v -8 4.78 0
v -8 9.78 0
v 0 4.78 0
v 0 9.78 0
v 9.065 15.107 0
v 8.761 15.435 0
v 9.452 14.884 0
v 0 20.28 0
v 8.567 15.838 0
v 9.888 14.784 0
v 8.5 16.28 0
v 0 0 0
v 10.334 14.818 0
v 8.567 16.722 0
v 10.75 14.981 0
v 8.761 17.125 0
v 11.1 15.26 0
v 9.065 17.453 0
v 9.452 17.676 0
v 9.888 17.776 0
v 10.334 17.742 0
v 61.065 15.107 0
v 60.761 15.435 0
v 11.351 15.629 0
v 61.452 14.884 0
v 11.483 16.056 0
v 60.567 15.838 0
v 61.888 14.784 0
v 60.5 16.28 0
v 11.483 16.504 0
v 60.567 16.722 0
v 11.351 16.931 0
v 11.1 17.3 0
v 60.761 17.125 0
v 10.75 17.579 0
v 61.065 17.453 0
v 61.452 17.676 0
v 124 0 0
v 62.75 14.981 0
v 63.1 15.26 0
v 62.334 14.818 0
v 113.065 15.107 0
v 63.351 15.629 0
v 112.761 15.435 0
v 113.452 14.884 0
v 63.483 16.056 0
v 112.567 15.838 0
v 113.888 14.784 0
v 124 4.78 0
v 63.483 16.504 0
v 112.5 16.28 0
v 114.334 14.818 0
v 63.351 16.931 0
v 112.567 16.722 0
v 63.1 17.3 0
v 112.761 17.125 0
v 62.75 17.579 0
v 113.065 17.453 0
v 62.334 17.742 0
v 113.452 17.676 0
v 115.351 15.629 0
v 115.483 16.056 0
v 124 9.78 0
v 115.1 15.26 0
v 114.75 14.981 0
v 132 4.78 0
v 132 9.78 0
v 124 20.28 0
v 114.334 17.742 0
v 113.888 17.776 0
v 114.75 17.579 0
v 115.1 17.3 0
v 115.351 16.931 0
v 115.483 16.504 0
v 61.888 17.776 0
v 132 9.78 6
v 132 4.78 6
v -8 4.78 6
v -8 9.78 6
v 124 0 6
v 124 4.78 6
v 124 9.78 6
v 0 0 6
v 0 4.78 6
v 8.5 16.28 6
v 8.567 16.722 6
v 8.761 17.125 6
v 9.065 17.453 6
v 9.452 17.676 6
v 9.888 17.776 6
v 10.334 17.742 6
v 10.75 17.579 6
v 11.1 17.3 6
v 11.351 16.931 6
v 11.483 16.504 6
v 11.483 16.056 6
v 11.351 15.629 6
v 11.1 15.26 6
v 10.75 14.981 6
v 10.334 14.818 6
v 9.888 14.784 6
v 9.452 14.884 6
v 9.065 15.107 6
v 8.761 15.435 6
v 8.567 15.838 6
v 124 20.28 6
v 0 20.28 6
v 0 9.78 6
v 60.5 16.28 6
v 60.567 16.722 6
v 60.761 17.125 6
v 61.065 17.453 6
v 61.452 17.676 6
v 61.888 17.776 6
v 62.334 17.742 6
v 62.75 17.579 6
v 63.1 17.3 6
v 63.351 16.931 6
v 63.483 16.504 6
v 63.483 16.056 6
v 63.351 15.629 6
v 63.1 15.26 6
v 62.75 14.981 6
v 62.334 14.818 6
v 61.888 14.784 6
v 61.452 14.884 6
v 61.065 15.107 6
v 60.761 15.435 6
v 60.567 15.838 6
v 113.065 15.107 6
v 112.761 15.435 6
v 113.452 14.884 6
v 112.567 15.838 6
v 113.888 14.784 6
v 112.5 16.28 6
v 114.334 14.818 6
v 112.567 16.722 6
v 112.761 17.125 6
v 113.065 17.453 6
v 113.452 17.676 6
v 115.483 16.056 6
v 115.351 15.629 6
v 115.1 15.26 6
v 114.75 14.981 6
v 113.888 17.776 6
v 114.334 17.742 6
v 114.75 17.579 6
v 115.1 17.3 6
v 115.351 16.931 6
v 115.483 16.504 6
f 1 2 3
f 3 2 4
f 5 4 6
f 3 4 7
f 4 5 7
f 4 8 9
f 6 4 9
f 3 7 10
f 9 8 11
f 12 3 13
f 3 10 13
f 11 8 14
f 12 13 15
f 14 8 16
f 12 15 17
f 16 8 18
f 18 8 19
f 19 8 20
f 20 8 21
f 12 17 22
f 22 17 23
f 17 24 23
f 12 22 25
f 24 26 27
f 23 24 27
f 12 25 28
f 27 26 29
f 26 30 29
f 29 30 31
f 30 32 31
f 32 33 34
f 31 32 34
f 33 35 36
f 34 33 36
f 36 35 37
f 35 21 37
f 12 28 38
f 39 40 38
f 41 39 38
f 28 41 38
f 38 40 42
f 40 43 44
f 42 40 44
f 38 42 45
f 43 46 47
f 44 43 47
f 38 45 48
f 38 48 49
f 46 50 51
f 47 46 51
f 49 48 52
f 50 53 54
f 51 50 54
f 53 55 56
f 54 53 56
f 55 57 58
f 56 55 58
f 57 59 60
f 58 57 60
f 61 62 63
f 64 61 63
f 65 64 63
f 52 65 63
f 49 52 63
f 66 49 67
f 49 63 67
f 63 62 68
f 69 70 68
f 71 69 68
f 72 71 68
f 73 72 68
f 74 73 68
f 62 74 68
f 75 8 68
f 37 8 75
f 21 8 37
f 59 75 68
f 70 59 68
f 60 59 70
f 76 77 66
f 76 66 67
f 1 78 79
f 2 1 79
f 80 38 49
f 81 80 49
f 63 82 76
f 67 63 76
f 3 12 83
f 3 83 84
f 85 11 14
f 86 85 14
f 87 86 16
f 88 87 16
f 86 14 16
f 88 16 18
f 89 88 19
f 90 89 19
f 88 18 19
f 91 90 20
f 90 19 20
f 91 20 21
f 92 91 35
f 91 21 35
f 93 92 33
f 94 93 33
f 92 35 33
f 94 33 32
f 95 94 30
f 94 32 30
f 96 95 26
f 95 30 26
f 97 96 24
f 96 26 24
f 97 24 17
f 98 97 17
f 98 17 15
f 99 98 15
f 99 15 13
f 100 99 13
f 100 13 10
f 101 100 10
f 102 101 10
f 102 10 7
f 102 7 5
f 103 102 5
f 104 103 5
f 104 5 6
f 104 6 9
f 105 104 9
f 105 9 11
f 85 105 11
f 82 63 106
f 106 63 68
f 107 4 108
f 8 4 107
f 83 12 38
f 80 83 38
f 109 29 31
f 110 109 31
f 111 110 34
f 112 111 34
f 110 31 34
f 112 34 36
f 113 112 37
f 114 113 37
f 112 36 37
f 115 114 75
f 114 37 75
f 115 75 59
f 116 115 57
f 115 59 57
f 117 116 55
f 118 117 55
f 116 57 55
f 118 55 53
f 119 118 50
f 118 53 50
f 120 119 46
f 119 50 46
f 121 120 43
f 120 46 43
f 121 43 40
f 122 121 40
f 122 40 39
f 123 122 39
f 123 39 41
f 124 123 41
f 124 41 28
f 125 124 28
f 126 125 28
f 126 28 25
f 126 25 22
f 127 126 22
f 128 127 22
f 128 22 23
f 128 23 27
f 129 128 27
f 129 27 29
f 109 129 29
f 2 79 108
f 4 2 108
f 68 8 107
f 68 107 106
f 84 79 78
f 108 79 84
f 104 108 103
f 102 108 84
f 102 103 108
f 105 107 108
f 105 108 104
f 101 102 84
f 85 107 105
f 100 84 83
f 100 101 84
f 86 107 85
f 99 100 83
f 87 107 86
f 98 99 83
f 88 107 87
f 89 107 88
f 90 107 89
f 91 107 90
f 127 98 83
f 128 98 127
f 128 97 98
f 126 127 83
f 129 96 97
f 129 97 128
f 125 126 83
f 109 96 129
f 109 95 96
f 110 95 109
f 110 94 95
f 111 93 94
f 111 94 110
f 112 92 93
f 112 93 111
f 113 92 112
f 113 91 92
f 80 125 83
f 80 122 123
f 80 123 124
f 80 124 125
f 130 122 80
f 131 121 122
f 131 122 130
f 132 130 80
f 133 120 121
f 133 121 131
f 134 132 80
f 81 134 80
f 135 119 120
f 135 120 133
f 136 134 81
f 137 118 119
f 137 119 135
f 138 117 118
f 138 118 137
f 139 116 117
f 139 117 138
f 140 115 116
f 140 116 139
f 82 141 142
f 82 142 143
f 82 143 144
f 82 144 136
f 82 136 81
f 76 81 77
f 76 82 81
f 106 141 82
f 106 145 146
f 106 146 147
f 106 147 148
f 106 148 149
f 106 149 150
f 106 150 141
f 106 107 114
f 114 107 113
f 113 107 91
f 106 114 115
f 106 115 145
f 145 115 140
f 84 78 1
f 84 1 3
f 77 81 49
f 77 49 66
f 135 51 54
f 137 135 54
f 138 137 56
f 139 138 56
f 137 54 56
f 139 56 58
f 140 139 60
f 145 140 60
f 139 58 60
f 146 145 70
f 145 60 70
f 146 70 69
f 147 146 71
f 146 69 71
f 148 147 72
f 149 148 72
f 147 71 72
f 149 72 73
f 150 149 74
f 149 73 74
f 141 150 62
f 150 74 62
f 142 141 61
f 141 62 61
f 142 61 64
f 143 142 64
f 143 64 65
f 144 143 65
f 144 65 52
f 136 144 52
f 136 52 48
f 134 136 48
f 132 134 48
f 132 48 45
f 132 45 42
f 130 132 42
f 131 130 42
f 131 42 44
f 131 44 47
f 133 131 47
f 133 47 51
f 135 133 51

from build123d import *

# Parameters (mm, degrees)
SKETCH_1_W          = 124
SKETCH_1_H          = 20.28
EXTRUDE_1_DEPTH     = 6
SKETCH_2_W          = 8
SKETCH_2_H          = 5
EXTRUDE_2_DEPTH     = 6
SKETCH_3_R          = 1.5
CUT_EXTRUDE_1_DEPTH = 134.683500852


with BuildPart() as part:
    # 草图1 → 凸台-拉伸1 (new body)
    with BuildSketch(Plane.XY):
        with Locations((62, 10.14)):
            Rectangle(SKETCH_1_W, SKETCH_1_H)
    extrude(amount=EXTRUDE_1_DEPTH)

    # 草图2 → 凸台-拉伸2 (add)
    with BuildSketch(Plane.XY.offset(6)):
        with Locations((-4, 7.28)):
            Rectangle(SKETCH_2_W, SKETCH_2_H)
        with Locations((128, 7.28)):
            Rectangle(SKETCH_2_W, SKETCH_2_H)
    extrude(amount=-EXTRUDE_2_DEPTH)

    # 草图3 → 切除-拉伸1 (cut, through all)
    with BuildSketch(Plane(origin=(0, 0, 0), x_dir=(-1, 0, 0), z_dir=(0, 0, -1))):
        with Locations((-62, 16.28)):
            Circle(SKETCH_3_R)
        with Locations((-114, 16.28)):
            Circle(SKETCH_3_R)
        with Locations((-10, 16.28)):
            Circle(SKETCH_3_R)
    extrude(amount=-CUT_EXTRUDE_1_DEPTH, mode=Mode.SUBTRACT)


solid = part.part
